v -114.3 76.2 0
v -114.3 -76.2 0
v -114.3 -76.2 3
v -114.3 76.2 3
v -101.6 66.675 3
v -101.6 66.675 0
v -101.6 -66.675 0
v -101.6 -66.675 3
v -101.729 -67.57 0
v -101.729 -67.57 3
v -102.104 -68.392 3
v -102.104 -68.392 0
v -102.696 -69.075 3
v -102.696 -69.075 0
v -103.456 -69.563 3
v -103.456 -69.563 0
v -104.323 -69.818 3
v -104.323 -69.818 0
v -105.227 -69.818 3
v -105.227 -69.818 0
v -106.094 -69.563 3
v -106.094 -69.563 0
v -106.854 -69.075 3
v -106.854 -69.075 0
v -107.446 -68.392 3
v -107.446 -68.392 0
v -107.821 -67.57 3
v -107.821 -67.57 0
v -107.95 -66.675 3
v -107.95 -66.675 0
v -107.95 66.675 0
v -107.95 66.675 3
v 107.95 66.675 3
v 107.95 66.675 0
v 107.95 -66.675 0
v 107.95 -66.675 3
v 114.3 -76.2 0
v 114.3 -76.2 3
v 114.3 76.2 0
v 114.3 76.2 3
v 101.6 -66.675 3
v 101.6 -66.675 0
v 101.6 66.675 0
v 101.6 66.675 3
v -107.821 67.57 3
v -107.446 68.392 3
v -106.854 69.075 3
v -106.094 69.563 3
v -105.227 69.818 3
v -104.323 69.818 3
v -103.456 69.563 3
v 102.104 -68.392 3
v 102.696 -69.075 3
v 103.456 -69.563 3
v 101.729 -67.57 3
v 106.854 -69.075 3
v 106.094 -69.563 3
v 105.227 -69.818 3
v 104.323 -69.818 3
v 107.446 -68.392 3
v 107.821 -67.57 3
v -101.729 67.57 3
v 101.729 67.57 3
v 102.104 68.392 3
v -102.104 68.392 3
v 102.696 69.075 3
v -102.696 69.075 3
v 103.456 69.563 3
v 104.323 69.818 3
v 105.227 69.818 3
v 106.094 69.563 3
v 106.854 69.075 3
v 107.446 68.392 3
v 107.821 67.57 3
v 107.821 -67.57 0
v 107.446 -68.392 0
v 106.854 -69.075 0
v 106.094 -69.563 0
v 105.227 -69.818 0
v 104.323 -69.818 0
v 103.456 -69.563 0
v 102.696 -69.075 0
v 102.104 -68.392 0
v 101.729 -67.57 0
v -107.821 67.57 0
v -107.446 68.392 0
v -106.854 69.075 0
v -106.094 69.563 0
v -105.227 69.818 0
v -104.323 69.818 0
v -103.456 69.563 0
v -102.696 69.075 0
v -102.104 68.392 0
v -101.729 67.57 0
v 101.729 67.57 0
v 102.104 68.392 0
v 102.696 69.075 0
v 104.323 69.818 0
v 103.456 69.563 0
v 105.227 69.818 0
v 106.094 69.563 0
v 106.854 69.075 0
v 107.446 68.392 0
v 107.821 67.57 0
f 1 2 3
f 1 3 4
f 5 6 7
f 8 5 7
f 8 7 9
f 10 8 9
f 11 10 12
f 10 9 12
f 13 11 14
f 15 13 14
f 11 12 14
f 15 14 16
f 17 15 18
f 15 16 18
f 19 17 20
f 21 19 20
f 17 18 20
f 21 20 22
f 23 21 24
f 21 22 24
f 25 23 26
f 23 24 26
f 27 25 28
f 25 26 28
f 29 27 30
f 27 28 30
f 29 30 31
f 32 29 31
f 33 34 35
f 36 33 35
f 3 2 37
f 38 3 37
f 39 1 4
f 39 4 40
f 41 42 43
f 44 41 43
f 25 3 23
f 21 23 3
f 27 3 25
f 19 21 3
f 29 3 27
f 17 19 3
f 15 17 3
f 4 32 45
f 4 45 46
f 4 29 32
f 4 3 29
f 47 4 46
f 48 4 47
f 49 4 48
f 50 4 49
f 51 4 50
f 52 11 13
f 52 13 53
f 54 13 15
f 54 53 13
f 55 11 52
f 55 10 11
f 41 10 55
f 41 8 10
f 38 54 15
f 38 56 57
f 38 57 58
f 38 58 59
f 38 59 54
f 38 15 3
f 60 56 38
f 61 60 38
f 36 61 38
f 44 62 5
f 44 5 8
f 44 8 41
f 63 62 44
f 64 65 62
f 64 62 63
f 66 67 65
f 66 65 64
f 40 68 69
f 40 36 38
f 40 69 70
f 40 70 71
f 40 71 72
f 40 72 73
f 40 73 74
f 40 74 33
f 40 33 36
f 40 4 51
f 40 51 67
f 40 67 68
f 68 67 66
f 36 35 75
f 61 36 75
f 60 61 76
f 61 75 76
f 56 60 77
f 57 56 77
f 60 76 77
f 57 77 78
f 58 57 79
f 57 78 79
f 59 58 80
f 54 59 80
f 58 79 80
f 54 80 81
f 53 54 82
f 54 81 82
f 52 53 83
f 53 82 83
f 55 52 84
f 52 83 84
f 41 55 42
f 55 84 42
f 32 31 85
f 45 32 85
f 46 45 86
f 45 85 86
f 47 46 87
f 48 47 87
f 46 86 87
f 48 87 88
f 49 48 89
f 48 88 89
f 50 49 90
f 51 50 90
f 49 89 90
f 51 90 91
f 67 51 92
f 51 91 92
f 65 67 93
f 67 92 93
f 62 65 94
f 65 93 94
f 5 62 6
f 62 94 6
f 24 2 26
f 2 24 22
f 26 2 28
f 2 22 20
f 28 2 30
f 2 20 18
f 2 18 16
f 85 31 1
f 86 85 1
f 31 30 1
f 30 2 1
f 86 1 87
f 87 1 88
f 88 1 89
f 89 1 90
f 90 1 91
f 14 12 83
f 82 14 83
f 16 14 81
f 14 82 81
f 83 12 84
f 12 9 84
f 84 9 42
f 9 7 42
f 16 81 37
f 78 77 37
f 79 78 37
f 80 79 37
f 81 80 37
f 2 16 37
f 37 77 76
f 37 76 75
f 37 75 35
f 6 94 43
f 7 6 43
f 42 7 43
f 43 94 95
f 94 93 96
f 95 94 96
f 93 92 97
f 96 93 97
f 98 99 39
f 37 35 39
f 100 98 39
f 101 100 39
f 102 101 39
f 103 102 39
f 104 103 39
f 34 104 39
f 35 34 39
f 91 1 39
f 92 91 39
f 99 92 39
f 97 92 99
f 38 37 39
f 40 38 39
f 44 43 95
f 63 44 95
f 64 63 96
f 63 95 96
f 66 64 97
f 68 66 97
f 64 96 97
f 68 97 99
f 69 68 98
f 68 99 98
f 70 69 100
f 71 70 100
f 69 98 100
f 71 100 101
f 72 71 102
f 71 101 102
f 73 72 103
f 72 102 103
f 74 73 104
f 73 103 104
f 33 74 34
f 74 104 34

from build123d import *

# Parameters (mm, degrees)
SKETCH1_W           = 228.6
SKETCH1_H           = 152.4
BOSS_EXTRUDE1_DEPTH = 3


with BuildPart() as part:
    # Sketch1 → Boss-Extrude1 (new body)
    with BuildSketch(Plane.XY):
        Rectangle(SKETCH1_W, SKETCH1_H)
        with BuildLine():
            Line((-101.6, 66.675), (-101.6, -66.675))
            ThreePointArc((-101.6, -66.675), (-104.775, -69.85), (-107.95, -66.675))
            Line((-107.95, -66.675), (-107.95, 66.675))
            ThreePointArc((-107.95, 66.675), (-104.775, 69.85), (-101.6, 66.675))
        make_face(mode=Mode.SUBTRACT)
        with BuildLine():
            Line((107.95, 66.675), (107.95, -66.675))
            ThreePointArc((107.95, -66.675), (104.775, -69.85), (101.6, -66.675))
            Line((101.6, -66.675), (101.6, 66.675))
            ThreePointArc((101.6, 66.675), (104.775, 69.85), (107.95, 66.675))
        make_face(mode=Mode.SUBTRACT)
    extrude(amount=BOSS_EXTRUDE1_DEPTH)


solid = part.part
